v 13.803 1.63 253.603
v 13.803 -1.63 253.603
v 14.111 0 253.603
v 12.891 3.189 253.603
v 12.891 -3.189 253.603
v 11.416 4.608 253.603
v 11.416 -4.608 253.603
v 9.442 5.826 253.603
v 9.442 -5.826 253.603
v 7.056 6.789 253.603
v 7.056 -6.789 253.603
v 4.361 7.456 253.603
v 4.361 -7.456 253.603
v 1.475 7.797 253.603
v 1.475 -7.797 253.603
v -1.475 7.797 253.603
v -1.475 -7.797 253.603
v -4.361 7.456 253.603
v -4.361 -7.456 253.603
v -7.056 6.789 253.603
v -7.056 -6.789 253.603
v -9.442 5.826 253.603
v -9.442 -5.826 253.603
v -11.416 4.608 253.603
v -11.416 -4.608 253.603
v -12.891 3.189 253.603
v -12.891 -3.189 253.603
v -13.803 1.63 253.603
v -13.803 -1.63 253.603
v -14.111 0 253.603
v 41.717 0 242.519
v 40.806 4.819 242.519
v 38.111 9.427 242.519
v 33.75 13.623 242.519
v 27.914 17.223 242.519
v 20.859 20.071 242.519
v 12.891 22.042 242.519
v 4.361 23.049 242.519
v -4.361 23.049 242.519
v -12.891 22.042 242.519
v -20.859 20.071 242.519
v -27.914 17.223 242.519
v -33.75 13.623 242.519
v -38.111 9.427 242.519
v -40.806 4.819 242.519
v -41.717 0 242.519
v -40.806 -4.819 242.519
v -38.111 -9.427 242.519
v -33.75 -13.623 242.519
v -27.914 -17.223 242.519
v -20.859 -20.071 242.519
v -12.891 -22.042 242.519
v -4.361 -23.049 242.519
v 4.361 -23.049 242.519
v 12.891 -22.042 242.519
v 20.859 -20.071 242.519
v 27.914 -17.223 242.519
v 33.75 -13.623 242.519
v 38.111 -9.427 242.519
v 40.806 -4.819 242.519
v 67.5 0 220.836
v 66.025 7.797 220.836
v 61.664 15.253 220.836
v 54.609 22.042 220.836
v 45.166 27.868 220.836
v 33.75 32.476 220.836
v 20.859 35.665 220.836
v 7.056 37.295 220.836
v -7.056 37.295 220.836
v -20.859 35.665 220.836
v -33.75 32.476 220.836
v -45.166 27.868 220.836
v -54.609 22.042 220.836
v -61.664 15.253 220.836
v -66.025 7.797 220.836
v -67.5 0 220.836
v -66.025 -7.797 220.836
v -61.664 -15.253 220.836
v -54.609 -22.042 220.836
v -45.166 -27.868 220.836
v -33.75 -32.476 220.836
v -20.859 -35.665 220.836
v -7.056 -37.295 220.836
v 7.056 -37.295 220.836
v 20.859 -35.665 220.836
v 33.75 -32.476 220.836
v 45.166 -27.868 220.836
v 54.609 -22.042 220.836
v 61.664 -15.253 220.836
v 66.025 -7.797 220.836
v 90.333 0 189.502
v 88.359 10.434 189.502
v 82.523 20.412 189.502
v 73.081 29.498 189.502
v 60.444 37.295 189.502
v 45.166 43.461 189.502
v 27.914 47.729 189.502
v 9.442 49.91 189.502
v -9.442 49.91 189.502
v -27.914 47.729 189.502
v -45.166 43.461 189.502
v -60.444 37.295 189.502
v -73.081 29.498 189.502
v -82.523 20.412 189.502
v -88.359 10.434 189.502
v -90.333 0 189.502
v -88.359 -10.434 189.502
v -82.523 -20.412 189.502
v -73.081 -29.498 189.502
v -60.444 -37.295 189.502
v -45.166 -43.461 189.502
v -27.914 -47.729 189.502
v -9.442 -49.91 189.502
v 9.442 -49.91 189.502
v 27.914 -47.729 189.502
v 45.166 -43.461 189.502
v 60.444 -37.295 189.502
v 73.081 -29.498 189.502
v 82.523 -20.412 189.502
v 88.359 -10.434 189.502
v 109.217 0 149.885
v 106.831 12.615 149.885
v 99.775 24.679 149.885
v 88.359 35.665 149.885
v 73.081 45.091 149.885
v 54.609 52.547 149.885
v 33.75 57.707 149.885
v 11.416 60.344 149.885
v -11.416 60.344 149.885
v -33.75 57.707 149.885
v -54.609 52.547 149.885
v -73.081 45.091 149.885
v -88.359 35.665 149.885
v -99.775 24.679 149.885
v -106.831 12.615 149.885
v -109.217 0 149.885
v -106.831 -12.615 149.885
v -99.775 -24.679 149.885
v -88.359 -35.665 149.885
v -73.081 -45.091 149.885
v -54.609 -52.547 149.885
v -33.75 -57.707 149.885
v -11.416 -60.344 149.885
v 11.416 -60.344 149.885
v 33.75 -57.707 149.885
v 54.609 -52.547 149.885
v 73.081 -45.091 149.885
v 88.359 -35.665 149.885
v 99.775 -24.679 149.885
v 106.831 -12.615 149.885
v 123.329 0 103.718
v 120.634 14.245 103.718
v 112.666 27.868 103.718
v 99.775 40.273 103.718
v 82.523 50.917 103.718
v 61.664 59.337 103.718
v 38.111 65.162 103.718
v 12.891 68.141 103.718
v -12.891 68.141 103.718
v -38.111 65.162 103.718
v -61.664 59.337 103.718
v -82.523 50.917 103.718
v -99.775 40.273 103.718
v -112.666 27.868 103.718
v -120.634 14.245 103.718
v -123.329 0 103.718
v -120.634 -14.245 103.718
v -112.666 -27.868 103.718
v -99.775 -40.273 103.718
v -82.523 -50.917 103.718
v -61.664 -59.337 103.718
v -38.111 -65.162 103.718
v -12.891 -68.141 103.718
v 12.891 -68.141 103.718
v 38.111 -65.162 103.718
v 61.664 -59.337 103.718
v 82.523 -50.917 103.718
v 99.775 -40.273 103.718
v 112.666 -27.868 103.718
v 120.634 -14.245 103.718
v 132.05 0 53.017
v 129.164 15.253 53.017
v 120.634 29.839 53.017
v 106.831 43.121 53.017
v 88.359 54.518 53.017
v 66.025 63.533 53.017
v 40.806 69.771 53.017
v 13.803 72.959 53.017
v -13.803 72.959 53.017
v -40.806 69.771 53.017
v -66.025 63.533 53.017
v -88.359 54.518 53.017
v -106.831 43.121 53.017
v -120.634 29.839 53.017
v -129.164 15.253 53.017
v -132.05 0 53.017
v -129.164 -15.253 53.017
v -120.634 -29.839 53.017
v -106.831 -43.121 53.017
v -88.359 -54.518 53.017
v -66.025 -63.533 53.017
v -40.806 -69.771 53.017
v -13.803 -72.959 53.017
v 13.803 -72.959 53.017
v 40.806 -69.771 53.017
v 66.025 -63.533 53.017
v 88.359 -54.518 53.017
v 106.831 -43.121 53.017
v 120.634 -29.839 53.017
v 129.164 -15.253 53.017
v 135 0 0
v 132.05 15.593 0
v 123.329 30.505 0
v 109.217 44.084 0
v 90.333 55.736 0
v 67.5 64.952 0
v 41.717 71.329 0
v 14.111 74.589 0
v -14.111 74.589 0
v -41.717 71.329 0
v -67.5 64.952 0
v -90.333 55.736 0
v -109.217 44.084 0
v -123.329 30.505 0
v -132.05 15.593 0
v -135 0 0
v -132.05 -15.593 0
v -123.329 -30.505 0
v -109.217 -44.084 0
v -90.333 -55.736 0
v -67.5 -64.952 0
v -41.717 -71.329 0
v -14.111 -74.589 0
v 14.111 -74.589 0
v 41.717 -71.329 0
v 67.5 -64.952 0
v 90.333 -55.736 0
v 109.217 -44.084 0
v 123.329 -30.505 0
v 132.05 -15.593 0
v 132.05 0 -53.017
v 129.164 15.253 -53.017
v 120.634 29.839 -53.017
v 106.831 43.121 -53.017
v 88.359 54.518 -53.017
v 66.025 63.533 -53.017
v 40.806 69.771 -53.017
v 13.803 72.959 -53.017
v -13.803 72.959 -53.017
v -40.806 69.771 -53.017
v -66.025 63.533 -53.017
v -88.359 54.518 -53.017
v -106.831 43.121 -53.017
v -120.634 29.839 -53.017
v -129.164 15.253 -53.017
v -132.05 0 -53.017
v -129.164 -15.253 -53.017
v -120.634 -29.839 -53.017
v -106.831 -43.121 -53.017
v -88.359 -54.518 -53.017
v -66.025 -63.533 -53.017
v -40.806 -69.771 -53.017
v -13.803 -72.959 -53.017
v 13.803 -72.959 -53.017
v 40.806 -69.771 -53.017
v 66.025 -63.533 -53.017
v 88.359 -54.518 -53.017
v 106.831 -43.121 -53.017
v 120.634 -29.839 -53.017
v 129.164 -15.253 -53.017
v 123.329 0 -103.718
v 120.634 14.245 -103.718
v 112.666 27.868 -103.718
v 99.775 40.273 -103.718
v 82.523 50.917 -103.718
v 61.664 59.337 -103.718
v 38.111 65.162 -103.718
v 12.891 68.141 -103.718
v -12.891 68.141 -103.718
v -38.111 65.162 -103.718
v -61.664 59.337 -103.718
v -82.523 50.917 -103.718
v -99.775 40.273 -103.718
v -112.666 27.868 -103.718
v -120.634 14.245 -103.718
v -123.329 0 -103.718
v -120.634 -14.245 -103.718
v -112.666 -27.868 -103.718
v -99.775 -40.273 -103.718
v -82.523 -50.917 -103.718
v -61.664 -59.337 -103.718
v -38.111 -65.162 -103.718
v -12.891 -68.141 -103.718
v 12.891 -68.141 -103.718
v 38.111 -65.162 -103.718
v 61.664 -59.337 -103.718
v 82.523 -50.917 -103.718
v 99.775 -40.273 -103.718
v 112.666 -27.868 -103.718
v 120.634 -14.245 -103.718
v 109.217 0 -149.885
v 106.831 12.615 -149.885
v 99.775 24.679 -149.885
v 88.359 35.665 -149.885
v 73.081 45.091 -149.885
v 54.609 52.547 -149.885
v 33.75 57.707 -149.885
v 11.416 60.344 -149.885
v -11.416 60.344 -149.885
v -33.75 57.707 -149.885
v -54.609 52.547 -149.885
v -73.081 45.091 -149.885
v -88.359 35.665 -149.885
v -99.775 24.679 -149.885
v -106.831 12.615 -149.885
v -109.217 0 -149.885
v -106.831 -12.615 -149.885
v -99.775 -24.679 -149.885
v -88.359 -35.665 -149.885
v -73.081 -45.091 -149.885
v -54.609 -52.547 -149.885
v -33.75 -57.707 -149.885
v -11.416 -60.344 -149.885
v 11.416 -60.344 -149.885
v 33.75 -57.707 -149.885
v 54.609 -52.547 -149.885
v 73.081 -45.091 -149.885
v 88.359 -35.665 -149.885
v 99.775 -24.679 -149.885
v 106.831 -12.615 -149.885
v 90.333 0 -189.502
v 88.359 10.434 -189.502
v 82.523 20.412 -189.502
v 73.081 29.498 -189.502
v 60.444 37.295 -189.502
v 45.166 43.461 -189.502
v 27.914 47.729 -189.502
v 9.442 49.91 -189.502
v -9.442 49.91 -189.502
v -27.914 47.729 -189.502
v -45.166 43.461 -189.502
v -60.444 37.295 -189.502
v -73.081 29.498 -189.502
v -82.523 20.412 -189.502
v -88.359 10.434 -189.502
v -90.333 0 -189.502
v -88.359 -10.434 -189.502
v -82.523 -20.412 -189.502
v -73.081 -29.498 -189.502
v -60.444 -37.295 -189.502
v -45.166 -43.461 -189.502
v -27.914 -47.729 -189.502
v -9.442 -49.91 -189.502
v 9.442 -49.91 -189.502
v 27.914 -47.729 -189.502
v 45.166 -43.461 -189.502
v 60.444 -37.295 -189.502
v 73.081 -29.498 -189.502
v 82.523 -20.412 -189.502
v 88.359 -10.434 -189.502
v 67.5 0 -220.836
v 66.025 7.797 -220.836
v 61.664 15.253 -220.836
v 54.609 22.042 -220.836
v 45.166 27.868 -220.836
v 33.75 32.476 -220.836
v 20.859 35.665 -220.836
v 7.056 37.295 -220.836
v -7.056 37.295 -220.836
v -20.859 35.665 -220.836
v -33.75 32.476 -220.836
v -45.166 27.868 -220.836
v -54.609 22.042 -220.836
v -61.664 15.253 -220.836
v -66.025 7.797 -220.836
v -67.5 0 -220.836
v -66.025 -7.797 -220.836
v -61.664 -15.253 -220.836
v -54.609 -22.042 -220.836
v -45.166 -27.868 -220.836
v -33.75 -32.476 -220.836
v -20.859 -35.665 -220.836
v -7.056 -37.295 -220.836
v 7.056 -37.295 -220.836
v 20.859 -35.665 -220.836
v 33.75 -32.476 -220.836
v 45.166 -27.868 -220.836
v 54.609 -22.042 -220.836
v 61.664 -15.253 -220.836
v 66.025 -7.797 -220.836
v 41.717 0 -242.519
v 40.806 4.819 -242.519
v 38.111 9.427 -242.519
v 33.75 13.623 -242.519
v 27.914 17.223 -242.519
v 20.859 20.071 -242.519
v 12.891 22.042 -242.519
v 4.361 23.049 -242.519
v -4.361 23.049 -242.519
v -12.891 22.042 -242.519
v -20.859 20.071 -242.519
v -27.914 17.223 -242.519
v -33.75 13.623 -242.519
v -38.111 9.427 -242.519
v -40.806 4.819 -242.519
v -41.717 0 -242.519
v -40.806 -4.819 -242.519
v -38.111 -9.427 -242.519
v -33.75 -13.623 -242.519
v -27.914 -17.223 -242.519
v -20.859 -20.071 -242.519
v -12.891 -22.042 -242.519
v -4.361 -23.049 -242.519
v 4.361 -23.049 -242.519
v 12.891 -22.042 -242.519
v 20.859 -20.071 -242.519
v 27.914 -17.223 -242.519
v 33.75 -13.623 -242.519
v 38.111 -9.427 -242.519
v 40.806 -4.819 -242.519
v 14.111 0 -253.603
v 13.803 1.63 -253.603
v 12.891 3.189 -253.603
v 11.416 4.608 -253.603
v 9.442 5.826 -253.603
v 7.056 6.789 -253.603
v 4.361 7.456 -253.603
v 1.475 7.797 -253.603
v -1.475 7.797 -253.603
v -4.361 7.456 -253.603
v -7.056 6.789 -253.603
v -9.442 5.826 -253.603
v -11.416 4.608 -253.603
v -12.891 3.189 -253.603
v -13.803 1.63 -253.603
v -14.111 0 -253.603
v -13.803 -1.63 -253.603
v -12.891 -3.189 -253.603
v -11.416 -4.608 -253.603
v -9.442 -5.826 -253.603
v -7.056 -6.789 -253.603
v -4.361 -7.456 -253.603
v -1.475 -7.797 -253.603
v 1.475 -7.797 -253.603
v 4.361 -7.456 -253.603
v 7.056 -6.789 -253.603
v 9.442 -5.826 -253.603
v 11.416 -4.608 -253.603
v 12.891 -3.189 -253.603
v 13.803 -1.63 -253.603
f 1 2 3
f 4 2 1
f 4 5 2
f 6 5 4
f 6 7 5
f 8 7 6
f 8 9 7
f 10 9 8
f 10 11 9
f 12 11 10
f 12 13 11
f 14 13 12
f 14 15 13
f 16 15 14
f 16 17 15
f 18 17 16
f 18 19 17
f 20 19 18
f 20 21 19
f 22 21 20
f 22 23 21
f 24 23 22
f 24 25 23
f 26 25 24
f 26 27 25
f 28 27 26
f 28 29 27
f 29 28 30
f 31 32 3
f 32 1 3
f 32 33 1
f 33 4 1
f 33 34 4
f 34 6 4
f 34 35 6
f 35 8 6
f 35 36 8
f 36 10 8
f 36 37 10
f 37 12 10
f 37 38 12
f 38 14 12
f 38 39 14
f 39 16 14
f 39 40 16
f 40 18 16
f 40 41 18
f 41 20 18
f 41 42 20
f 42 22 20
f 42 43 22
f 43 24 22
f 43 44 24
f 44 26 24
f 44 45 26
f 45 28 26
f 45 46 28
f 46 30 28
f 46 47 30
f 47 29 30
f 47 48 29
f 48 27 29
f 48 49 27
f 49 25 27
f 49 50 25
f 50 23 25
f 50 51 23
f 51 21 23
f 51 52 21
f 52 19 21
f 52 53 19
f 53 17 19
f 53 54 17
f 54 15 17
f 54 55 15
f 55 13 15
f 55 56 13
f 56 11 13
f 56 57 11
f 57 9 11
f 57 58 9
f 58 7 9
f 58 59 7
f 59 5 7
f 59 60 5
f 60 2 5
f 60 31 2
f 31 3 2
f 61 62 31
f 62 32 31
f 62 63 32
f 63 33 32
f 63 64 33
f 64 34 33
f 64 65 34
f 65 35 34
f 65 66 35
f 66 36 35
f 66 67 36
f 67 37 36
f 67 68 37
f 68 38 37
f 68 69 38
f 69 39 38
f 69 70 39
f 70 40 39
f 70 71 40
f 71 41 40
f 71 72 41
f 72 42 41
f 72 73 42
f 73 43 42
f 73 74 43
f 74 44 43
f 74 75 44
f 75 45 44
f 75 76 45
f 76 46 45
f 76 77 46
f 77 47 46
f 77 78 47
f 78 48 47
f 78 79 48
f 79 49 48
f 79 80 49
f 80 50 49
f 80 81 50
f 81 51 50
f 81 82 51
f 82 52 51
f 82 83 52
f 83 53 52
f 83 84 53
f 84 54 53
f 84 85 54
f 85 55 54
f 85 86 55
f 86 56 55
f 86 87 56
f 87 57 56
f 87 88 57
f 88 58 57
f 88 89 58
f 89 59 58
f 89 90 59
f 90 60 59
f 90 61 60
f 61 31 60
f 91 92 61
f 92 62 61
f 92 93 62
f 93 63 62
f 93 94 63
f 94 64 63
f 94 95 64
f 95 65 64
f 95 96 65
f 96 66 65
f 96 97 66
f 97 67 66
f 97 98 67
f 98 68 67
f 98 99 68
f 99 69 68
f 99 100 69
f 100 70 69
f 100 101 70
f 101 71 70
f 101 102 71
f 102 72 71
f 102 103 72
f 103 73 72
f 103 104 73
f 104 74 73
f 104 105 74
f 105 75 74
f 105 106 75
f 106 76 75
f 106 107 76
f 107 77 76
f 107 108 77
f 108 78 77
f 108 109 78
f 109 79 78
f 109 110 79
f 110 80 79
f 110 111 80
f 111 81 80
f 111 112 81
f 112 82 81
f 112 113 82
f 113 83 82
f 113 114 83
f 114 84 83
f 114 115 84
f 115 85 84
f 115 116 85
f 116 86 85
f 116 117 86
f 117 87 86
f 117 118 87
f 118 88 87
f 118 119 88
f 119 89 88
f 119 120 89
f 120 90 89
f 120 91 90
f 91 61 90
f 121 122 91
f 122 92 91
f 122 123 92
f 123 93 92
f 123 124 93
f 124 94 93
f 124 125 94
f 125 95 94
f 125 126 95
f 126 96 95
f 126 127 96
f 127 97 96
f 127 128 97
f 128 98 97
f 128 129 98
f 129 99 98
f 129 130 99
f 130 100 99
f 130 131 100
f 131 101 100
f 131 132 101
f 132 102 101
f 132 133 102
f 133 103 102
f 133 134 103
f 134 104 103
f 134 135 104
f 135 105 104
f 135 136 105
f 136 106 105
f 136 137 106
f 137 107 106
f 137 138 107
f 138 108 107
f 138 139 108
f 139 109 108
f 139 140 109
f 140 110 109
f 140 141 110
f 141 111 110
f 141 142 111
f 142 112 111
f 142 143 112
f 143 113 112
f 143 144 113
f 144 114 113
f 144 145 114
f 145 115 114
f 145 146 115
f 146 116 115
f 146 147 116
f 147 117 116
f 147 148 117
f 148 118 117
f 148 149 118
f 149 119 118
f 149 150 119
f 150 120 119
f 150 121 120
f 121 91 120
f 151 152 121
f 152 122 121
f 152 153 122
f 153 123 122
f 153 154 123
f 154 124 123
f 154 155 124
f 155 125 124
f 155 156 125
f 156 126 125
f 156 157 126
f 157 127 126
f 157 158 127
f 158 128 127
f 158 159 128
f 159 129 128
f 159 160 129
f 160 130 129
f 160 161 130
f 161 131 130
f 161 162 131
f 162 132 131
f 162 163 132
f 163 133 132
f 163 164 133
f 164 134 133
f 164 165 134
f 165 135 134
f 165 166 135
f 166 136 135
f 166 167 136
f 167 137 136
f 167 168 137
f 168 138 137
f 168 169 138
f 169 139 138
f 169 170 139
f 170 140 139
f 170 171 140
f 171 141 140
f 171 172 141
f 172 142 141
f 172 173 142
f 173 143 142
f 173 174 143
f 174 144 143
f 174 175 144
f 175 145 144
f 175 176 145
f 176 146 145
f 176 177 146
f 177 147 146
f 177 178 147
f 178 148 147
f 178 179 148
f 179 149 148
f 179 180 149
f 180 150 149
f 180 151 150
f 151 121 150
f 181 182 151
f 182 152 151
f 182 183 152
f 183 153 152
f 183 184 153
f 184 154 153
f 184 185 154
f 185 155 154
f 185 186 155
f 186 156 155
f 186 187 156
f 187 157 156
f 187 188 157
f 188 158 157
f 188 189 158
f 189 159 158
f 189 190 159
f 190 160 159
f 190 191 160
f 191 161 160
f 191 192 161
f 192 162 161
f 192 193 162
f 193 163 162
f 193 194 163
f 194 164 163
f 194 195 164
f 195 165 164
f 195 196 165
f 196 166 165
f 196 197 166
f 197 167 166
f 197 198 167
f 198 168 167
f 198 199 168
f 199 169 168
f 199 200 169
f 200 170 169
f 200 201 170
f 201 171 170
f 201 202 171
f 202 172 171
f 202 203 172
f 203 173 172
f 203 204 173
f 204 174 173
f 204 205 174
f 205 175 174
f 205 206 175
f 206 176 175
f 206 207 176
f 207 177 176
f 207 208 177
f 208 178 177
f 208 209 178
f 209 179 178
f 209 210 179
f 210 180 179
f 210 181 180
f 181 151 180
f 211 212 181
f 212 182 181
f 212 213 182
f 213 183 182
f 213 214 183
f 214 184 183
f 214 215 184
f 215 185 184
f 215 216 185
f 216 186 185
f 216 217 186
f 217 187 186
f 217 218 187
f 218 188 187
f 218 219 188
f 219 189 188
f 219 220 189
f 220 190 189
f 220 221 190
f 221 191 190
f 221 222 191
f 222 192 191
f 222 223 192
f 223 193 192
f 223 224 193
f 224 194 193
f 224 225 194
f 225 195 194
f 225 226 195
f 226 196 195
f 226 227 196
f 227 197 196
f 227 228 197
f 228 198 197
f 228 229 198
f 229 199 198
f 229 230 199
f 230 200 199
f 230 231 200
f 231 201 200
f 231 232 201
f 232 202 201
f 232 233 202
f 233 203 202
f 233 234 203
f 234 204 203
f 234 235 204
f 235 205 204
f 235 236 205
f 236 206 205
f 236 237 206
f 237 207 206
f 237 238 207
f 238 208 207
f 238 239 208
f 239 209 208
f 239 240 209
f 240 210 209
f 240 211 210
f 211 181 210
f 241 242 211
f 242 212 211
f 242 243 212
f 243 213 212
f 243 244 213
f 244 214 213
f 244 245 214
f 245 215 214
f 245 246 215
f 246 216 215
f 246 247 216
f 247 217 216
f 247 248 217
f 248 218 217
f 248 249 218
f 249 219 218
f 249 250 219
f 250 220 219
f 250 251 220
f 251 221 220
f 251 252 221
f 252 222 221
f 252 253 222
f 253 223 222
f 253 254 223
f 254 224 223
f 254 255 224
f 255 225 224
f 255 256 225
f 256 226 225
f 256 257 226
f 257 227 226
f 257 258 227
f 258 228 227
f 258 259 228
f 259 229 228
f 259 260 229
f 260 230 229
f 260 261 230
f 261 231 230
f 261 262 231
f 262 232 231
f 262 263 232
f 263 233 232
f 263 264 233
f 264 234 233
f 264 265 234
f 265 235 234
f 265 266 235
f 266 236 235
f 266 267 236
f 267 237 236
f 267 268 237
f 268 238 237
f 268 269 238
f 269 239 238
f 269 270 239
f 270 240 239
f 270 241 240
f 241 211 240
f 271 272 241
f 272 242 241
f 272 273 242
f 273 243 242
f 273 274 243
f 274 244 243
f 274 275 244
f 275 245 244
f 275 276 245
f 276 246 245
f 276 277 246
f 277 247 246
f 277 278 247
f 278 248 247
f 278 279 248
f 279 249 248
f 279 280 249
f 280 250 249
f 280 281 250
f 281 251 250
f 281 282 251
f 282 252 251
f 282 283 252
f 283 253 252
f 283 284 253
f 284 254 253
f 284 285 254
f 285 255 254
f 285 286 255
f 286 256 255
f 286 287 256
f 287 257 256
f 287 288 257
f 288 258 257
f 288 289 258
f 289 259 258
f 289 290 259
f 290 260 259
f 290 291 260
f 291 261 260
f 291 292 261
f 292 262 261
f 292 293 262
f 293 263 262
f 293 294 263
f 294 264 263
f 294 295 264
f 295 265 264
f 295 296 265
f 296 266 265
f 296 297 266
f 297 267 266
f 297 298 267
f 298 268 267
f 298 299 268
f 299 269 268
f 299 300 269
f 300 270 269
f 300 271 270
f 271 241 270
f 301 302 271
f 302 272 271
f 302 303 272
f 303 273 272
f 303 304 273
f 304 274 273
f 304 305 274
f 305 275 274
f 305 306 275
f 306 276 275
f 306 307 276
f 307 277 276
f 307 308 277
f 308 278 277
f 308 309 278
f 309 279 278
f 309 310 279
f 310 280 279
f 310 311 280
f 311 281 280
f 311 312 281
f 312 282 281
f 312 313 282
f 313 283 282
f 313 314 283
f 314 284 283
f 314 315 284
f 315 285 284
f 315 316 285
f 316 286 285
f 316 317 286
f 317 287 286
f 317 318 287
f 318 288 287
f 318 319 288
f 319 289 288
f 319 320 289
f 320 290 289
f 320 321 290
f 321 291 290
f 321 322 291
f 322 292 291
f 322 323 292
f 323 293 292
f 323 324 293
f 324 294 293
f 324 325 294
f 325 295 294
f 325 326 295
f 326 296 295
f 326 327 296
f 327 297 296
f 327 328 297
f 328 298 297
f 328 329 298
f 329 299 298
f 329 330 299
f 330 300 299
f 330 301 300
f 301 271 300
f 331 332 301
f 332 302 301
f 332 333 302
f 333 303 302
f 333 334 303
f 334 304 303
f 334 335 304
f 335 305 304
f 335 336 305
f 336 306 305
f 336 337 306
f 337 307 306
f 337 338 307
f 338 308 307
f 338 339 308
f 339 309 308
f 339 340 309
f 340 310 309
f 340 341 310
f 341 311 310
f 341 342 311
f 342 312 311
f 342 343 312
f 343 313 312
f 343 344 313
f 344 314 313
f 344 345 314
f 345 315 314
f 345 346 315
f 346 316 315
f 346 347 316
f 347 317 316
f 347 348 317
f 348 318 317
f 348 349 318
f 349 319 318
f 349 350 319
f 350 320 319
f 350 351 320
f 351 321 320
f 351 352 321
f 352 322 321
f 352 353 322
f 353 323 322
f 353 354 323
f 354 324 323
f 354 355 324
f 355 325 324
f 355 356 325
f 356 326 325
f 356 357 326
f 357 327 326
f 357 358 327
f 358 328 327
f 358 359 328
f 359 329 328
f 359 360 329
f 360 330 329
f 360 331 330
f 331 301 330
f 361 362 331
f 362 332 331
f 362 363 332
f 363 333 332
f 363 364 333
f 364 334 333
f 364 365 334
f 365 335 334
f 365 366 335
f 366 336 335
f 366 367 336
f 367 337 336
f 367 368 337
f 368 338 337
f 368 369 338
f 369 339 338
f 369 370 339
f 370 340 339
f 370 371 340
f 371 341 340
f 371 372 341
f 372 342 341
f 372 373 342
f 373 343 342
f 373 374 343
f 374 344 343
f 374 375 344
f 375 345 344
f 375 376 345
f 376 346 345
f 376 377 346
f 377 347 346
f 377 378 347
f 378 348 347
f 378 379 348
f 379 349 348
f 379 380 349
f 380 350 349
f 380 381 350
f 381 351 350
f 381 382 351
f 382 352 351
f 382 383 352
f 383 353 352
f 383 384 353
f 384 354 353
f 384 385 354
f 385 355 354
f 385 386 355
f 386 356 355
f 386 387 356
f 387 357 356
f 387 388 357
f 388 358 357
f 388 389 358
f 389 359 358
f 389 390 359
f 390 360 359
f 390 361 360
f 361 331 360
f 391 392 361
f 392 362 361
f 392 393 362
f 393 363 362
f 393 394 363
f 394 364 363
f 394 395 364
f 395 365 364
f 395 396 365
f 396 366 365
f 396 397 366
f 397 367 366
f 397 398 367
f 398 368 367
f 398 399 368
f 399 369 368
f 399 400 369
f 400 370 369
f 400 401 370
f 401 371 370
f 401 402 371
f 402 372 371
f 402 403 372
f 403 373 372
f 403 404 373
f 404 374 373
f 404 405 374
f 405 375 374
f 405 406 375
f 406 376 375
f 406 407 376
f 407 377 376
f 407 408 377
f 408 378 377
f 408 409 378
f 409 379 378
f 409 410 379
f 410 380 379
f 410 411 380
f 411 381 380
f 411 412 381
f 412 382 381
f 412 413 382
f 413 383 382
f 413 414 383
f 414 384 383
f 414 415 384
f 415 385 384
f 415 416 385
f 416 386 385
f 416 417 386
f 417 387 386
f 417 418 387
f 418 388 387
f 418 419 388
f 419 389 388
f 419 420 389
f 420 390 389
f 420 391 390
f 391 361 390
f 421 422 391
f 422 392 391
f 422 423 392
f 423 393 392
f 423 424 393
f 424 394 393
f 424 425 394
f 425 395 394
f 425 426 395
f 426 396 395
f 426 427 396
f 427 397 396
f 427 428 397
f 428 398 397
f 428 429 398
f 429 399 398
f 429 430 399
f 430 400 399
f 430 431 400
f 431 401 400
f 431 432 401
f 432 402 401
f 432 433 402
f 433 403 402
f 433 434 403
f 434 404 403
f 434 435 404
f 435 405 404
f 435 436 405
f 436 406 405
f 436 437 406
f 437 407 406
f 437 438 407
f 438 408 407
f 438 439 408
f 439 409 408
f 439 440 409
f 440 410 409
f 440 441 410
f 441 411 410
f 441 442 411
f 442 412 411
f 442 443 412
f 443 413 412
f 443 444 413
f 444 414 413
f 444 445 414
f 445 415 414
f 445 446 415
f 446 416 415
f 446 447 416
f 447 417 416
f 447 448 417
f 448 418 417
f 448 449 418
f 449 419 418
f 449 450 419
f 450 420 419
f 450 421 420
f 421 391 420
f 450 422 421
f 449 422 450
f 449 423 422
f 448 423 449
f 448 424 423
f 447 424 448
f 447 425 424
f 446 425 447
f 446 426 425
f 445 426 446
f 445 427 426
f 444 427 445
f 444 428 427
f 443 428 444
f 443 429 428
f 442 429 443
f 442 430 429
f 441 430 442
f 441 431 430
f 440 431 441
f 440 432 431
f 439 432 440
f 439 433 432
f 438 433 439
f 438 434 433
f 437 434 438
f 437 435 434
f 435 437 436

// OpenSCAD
// Generated by SolidPython 1.0.1 on 2020-07-29 00:46:48


scale(v = [9, 5, 17]) {
	sphere(r = 15);
}
/***********************************************
*********      SolidPython code:      **********
************************************************
 
# import packages: SolidPython
from solid import *
from solid.utils import *
from itertools import chain, combinations, permutations


class Resize:

    def __init__(self, scad_file):
        self.scad_file = scad_file
        #self.scad_file = import_scad(scad_file)
        # cone/cylinder param:
        self.r1 = 0
        self.r2 = 0
        self.h = 0
        # rectangular prism param:
        self.w = 0
        self.l = 0
        # ellipse param:
        self.r = 0

    # import OpenScad code (file name corresponds to shape)


    # classify shape + parameters
    def assign(self, param1, param2, param3):
        if self.scad_file == 'cone.scad':
            self.r1 = param1
            self.r2 = param2
            self.h = param3
        elif self.scad_file == 'cylinder.scad':
            self.r1 = param1
            self.r2 = param2
            self.h = param3
        elif self.scad_file == 'rectangularPrism.scad':
            self.h = param1
            self.l = param2
            self.w = param3
        else:
            self.r = param1
            self.h = param2

    # resize parameters
    def iterate(self):
        x = range(3, 20, 2)
        i = 1
        if self.scad_file == 'cone.scad':
            tempList = list(permutations(x, 2))
            for temp in tempList:
                param1 = temp[0]
                param2 = temp[1]
                filepath = 'produced_scad_files/' + 'cone' + str(param1) + '_' + str(param2) + '_' + '.scad'
                scad_render_to_file(cylinder(h=param1, r1=param2, r2=0), filepath)

        elif self.scad_file == 'cylinder.scad':
            tempList = list(permutations(x, 3))
            for temp in tempList:
                param1 = temp[0]
                param2 = temp[1]
                filepath = 'produced_scad_files/' + 'cylinder' + str(param1) + '_' + str(param2) + '_' + '.scad'
                scad_render_to_file(cylinder(h=param1, r1=param2, r2=param2), filepath)

        elif self.scad_file == 'rectangularPrism.scad':
            tempList = list(permutations(x, 3))
            for temp in tempList:
                param1 = temp[0]
                param2 = temp[1]
                param3 = temp[2]
                filepath = 'produced_scad_files/' + 'rectangularPrism' + str(param1) + '_' + str(param2) + '_' + str(
                    param3) + '.scad'
                scad_render_to_file(cube(size=(param1, param2, param3)), filepath)

        elif self.scad_file == 'ellipse.scad':
            tempList = list(permutations(x, 4))
            for temp in tempList:
                param1 = temp[0]
                param2 = temp[1]
                param3 = temp[2]
                param4 = temp[3]
                filepath = 'produced_scad_files/' + 'ellipse' + str(param1) + '_' + str(param2) + '_' + str(param3) + '_' + str(param4) + '.scad'
                scad_render_to_file(scale([param1, param2, param3])(sphere(r=param4)), filepath)

    def render_to_scadfile(self):
        scad_render_to_file(scad, 'example.scad') 
 
************************************************/
